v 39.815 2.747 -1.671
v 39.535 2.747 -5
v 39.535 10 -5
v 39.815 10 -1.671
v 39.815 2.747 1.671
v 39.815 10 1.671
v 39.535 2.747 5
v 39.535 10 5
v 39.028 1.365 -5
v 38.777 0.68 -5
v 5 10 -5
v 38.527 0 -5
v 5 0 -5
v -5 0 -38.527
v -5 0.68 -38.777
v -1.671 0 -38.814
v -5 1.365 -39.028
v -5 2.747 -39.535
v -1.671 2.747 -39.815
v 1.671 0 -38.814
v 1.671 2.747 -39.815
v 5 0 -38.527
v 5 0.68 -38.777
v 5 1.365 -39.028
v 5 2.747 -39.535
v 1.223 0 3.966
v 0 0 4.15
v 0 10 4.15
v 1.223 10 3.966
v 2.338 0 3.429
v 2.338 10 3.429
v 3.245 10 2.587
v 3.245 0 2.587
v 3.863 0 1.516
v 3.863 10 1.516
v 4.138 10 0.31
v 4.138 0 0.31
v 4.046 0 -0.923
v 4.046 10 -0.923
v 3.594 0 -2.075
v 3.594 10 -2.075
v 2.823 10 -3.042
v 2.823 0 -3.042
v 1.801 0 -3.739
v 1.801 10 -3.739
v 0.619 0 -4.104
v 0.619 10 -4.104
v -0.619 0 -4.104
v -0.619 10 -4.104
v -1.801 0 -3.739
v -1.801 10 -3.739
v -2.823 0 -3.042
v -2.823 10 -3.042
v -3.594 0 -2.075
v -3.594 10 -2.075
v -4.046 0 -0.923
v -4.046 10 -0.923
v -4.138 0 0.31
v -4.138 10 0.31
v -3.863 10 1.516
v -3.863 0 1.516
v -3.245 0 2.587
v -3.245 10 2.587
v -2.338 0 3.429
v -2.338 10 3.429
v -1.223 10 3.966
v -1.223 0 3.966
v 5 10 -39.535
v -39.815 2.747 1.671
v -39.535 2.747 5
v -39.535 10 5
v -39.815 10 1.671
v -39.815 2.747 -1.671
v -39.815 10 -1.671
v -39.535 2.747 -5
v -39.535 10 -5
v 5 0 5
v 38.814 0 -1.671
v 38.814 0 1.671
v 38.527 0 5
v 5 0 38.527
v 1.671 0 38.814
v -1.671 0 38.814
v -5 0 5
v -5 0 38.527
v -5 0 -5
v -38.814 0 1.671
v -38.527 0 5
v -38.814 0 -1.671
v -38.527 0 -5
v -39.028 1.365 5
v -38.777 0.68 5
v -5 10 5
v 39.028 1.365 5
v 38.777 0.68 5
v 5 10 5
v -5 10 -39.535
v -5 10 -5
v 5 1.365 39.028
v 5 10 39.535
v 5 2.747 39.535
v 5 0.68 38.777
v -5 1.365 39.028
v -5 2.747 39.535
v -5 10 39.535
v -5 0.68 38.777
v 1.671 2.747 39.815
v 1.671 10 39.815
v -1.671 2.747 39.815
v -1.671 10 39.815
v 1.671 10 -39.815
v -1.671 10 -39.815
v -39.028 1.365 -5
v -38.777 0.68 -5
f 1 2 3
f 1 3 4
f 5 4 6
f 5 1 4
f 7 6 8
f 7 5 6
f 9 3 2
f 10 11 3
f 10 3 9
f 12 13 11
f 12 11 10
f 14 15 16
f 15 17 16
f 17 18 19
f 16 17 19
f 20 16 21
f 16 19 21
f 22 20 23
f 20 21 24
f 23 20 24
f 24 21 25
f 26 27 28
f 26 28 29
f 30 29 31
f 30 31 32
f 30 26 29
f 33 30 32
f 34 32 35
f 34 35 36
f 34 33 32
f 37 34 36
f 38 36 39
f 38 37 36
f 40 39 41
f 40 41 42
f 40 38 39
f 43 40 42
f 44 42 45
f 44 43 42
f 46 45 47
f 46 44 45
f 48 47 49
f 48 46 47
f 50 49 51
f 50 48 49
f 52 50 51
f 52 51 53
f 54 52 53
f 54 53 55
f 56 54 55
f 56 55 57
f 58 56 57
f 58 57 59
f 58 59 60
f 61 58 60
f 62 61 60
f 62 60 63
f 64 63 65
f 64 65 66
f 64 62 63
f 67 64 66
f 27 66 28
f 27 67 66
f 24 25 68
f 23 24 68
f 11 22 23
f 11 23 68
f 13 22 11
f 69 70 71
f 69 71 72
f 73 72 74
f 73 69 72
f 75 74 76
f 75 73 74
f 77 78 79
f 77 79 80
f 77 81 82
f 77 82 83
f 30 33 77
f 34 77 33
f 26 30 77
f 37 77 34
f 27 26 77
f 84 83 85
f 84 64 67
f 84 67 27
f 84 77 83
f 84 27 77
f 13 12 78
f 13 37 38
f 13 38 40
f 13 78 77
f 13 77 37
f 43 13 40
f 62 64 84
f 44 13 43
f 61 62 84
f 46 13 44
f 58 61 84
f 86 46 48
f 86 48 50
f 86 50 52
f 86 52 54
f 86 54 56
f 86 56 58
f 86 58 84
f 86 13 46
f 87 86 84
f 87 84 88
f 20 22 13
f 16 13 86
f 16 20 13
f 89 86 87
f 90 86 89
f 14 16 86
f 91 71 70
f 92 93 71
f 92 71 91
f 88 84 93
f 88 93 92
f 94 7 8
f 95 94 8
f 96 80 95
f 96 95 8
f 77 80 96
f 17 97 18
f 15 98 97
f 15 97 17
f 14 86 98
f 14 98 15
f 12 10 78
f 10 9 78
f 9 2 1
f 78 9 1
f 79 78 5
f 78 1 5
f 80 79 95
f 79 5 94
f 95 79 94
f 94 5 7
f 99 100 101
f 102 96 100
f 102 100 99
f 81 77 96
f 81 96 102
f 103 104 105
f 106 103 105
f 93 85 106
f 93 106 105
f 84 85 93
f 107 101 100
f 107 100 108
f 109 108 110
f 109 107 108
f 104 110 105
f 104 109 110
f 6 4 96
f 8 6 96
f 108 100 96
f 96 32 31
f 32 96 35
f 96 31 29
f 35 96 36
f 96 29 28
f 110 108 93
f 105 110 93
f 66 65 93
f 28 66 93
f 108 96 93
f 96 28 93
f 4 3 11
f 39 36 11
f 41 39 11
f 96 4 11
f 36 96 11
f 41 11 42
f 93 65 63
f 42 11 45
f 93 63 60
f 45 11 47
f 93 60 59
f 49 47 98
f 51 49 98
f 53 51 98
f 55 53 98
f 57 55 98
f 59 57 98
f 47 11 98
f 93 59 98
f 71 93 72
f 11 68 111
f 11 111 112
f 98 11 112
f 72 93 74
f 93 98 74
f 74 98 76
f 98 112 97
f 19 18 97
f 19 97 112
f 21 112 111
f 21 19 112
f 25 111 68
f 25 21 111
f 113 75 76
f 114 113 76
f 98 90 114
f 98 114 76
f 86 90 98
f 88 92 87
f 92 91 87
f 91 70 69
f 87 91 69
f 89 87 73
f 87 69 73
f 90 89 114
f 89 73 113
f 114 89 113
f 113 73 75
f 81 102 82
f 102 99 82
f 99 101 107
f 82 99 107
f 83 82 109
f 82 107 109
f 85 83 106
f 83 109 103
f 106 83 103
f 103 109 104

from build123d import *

# Parameters (mm, degrees)
SKETCH1_R           = 4.15
BOSS_EXTRUDE1_DEPTH = 10
CHAMFER1_SIZE       = 1
CHAMFER1_SIZE2      = 2.747477419


with BuildPart() as part:
    # Sketch1 → Boss-Extrude1 (new body)
    with BuildSketch(Plane(origin=(0, 0, 0), x_dir=(1, 0, 0), z_dir=(0, 1, 0))):
        with BuildLine():
            Line((-39.53507936, 5), (-5, 5))
            Line((-5, 5), (-5, 39.53507936))
            ThreePointArc((-5, 39.53507936), (0, 39.85), (5, 39.53507936))
            Line((5, 39.53507936), (5, 5))
            Line((5, 5), (39.53507936, 5))
            ThreePointArc((39.53507936, 5), (39.85, 0), (39.53507936, -5))
            Line((39.53507936, -5), (5, -5))
            Line((5, -5), (5, -39.53507936))
            ThreePointArc((5, -39.53507936), (0, -39.85), (-5, -39.53507936))
            Line((-5, -39.53507936), (-5, -5))
            Line((-5, -5), (-39.53507936, -5))
            ThreePointArc((-39.53507936, -5), (-39.85, 0), (-39.53507936, 5))
        make_face()
        with Locations(Location((0, 0, 0), (0, 0, 270))):  # turned: the seam where the file's is
            Circle(SKETCH1_R, mode=Mode.SUBTRACT)
    extrude(amount=BOSS_EXTRUDE1_DEPTH)

    # Chamfer1
    chamfer1_edges = [part.edges().sort_by_distance(p)[0] for p in [
        (39.85, 0, 0),
        (0, 0, 39.85),
        (-39.85, 0, 0),
        (0, 0, -39.85),
    ]]
    chamfer1_side = [part.faces().sort_by_distance(p)[0] for p in [
        (-22.26753968, 0, -3.872871791),
    ]]
    chamfer(chamfer1_edges, length=CHAMFER1_SIZE, length2=CHAMFER1_SIZE2, reference=chamfer1_side[0])


solid = part.part
